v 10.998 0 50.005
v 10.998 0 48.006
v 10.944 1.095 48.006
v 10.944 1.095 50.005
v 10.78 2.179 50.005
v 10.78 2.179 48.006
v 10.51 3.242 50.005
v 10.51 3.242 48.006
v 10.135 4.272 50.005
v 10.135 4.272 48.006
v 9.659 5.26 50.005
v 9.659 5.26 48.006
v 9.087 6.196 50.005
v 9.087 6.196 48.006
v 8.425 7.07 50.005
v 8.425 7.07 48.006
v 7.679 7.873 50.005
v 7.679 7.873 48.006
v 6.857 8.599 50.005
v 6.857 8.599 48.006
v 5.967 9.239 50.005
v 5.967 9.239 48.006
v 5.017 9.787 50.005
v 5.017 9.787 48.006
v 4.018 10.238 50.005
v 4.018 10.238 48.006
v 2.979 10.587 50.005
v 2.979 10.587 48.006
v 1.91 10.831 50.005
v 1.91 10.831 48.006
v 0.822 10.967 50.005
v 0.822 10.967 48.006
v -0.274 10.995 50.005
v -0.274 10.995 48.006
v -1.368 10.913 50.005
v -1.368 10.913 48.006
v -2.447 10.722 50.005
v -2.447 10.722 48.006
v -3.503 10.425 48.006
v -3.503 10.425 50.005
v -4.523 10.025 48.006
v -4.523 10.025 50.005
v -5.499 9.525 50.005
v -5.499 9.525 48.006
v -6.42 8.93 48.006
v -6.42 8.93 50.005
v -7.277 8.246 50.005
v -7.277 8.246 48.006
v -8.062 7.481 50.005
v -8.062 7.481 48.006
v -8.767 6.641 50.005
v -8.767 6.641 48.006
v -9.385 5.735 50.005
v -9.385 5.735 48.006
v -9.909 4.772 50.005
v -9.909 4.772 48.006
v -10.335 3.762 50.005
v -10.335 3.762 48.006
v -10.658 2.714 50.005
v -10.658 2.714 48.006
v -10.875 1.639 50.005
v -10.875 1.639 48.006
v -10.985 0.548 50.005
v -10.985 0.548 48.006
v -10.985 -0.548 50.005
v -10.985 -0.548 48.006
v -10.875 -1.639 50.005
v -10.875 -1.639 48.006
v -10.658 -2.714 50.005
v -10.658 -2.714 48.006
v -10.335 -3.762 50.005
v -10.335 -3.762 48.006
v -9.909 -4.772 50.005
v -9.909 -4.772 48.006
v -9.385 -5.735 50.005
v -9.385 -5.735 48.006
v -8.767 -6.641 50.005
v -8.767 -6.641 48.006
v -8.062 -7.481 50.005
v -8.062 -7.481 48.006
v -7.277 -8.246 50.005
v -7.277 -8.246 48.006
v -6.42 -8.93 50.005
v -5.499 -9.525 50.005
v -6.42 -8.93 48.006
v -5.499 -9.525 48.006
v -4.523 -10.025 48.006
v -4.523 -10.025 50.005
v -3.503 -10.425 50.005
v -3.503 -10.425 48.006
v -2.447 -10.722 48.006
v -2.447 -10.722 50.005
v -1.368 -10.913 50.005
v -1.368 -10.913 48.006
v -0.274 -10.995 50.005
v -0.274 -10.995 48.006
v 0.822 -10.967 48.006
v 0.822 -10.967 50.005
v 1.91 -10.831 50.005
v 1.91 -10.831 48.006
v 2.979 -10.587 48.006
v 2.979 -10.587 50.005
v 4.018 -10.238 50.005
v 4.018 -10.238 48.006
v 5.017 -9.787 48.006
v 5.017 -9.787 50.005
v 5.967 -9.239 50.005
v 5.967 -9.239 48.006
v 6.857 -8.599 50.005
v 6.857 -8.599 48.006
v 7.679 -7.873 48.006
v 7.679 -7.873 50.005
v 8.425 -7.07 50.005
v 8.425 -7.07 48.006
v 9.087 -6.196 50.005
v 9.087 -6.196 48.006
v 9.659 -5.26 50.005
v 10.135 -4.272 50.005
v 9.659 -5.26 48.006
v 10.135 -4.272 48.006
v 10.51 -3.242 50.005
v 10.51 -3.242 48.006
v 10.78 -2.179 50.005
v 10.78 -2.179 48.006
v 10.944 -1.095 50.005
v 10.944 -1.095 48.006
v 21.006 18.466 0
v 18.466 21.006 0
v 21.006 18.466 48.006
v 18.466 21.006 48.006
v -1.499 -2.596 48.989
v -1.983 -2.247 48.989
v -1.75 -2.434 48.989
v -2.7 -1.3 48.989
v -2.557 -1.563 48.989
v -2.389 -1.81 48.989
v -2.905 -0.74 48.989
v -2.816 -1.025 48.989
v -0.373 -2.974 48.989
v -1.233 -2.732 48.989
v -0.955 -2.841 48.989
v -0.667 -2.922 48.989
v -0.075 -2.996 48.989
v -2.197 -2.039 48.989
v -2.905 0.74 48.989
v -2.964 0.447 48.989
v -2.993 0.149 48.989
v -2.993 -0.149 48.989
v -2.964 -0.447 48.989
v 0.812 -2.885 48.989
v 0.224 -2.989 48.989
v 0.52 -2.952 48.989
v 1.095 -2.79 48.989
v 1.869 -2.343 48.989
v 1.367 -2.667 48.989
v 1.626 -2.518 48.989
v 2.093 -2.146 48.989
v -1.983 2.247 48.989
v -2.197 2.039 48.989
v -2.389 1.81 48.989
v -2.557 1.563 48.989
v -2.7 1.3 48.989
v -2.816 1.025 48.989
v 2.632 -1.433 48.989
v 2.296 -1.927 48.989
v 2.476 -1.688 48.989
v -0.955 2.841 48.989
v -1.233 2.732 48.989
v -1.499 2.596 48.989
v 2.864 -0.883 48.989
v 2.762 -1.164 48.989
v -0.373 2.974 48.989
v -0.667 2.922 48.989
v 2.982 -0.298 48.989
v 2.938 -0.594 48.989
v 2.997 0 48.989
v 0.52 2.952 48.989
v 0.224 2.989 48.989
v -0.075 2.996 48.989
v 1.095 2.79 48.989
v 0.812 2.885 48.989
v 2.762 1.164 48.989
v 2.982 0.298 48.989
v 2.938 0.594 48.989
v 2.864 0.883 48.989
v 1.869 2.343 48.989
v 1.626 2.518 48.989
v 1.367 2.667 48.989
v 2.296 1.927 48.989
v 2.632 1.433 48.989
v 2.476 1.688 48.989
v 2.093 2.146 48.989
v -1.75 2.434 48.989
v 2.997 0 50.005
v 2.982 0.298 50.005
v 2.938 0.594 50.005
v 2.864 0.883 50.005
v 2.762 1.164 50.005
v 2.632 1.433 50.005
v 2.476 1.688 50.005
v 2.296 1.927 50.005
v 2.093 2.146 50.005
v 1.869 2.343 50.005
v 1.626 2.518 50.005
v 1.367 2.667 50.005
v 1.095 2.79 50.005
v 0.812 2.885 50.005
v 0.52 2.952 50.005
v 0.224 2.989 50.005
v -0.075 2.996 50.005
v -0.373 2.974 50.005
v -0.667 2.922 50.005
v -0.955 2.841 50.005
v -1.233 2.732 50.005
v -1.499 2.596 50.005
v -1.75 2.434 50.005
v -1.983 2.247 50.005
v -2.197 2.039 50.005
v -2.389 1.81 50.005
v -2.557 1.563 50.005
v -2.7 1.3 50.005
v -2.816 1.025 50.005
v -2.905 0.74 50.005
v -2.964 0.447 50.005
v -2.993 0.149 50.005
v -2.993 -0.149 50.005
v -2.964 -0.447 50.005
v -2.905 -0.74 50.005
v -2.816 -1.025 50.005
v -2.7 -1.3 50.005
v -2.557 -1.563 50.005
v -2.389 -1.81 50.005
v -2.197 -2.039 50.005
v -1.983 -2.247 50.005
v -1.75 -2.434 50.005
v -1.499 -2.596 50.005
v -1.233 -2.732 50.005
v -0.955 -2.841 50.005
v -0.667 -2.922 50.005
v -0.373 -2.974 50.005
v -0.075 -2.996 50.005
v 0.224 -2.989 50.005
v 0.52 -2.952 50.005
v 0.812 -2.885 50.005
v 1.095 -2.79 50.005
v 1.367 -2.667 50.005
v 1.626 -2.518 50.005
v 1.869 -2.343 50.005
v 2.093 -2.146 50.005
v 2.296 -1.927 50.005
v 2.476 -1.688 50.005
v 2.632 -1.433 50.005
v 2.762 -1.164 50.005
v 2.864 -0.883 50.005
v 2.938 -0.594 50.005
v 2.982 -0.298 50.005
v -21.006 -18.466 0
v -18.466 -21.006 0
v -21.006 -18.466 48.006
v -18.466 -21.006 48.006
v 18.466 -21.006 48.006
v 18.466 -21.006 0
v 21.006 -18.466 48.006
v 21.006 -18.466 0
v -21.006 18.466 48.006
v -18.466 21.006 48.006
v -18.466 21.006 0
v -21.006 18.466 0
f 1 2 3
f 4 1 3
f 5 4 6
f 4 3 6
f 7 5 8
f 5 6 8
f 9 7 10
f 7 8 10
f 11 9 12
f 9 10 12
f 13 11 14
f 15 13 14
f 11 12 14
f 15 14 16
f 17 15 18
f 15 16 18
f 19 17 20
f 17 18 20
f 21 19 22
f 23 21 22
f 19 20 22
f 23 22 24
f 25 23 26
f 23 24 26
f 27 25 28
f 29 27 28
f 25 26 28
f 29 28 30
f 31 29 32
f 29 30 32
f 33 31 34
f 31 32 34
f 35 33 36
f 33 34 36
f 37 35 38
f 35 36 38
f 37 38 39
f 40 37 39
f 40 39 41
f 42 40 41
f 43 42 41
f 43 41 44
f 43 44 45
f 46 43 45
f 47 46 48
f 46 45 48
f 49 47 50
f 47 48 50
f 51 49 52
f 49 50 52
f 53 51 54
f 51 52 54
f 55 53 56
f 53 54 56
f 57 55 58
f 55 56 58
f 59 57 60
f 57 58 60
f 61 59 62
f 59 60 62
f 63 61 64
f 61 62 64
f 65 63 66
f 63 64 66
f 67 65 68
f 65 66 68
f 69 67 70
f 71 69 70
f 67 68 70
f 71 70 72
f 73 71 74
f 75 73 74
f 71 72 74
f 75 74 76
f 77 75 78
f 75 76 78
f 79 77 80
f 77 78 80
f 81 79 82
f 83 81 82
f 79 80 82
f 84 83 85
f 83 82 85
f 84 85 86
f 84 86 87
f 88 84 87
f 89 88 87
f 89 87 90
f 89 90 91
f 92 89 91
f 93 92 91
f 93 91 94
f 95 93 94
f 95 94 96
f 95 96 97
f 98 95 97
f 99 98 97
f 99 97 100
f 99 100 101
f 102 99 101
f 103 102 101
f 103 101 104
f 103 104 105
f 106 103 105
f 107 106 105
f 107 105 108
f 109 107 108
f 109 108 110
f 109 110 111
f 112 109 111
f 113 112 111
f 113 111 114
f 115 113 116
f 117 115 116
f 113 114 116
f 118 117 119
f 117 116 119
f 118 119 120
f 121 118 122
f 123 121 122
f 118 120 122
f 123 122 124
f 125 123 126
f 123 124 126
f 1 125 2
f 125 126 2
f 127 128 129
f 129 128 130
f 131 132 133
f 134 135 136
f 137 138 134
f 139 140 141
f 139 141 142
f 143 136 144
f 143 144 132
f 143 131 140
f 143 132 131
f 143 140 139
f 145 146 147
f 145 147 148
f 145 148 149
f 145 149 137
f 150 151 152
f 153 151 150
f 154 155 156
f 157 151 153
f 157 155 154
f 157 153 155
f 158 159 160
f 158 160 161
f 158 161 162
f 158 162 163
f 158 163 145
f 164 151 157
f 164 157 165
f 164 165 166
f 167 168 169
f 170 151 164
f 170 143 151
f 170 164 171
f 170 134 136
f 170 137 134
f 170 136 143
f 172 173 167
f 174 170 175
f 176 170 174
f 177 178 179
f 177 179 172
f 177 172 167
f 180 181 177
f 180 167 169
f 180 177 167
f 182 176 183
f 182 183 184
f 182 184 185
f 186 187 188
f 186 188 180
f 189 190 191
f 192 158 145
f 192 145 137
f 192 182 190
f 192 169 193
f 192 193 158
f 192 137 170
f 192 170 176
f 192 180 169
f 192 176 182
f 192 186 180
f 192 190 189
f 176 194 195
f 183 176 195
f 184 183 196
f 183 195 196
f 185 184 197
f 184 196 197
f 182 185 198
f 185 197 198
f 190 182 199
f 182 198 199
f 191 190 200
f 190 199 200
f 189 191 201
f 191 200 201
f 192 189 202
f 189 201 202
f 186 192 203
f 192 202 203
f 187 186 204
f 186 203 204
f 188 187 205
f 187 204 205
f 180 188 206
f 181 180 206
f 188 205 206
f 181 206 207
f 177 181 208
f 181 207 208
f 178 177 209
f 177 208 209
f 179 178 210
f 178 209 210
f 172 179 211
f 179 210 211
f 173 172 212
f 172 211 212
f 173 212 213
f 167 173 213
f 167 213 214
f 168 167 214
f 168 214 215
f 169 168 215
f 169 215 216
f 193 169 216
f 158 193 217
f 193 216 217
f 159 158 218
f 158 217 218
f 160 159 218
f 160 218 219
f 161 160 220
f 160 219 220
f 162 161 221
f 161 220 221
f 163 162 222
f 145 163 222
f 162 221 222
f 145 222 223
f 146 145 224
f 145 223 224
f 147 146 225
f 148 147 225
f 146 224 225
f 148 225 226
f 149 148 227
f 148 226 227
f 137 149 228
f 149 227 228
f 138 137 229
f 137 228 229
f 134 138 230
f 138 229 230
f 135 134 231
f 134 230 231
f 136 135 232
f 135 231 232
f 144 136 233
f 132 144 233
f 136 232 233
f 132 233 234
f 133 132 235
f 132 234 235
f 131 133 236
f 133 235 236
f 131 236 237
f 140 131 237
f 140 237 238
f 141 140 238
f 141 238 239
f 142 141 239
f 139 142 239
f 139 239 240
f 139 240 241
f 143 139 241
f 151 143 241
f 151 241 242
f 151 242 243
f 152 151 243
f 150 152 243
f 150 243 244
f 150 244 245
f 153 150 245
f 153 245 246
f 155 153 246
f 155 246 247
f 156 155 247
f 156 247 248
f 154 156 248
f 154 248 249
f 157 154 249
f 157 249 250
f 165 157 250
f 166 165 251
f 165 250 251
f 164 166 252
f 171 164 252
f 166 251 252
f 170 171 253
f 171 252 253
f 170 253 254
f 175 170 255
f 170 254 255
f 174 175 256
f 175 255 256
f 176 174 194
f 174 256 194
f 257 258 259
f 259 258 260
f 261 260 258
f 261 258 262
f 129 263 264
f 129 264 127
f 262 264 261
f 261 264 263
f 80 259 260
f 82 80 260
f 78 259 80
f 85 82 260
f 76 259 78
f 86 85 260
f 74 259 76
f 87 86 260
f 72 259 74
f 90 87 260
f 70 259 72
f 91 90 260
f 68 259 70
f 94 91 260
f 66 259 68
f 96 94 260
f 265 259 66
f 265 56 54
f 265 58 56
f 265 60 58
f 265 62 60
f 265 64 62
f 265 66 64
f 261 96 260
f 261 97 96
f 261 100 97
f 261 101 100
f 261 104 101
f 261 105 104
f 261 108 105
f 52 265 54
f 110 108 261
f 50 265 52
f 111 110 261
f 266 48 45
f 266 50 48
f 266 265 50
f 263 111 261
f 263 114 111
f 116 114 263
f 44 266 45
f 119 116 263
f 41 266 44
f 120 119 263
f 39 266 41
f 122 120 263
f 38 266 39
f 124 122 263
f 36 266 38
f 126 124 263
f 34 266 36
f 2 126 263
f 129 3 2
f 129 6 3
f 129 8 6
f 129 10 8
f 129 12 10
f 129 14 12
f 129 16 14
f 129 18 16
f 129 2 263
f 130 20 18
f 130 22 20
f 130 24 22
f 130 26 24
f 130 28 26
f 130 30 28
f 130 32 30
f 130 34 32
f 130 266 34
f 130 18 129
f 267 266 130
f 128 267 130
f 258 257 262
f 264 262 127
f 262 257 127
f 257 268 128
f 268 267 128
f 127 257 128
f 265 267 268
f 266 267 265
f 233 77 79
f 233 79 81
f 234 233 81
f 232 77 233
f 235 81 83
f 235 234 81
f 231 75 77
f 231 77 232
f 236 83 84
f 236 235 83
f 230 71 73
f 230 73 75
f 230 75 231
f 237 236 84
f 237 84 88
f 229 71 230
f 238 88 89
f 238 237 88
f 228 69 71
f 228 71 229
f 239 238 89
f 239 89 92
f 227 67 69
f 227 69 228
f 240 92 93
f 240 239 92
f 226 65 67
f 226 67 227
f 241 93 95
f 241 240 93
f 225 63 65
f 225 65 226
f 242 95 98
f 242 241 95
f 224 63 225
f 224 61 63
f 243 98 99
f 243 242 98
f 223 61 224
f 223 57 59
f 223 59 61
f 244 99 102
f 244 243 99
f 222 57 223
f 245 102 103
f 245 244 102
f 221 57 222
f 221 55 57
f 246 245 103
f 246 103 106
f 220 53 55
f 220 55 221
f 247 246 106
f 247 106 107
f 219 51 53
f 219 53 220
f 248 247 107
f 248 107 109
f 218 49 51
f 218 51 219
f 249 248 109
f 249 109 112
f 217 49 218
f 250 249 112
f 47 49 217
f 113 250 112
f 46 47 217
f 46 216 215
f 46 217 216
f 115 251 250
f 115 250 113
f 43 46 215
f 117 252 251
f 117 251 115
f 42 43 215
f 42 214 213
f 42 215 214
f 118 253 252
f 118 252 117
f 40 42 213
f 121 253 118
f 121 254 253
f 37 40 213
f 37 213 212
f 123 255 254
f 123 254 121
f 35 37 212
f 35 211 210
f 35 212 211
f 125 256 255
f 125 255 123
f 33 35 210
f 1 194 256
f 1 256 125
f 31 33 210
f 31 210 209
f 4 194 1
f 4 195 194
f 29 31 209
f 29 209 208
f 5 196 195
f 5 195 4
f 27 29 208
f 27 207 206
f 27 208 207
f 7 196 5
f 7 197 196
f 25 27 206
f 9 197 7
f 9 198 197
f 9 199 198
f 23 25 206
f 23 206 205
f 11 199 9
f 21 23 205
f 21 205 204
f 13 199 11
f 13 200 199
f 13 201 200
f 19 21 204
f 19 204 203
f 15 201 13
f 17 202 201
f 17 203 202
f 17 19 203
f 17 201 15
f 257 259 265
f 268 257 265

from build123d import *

# Parameters (mm, degrees)
SKETCH1_W           = 42.0116
SKETCH1_H           = 42.0116
BOSS_EXTRUDE1_DEPTH = 48.006
CHAMFER1_SIZE       = 2.54
SKETCH2_R           = 10.9982
BOSS_EXTRUDE2_DEPTH = 1.99898
SKETCH3_R           = 2.9972
CUT_EXTRUDE1_DEPTH  = 1.016


with BuildPart() as part:
    # Sketch1 → Boss-Extrude1 (new body)
    with BuildSketch(Plane.XY):
        Rectangle(SKETCH1_W, SKETCH1_H)
    extrude(amount=BOSS_EXTRUDE1_DEPTH)

    # Chamfer1
    chamfer1_edges = [part.edges().sort_by_distance(p)[0] for p in [
        (-21.0058, 21.0058, 24.003),
        (21.0058, 21.0058, 24.003),
        (21.0058, -21.0058, 24.003),
        (-21.0058, -21.0058, 24.003),
    ]]
    chamfer(chamfer1_edges, length=CHAMFER1_SIZE)

    # Sketch2 → Boss-Extrude2 (add)
    with BuildSketch(Plane.XY.offset(48.006)):
        Circle(SKETCH2_R)
    extrude(amount=BOSS_EXTRUDE2_DEPTH)

    # Sketch3 → Cut-Extrude1 (cut)
    with BuildSketch(Plane.XY.offset(50.00498)):
        Circle(SKETCH3_R)
    extrude(amount=-CUT_EXTRUDE1_DEPTH, mode=Mode.SUBTRACT)


solid = part.part
